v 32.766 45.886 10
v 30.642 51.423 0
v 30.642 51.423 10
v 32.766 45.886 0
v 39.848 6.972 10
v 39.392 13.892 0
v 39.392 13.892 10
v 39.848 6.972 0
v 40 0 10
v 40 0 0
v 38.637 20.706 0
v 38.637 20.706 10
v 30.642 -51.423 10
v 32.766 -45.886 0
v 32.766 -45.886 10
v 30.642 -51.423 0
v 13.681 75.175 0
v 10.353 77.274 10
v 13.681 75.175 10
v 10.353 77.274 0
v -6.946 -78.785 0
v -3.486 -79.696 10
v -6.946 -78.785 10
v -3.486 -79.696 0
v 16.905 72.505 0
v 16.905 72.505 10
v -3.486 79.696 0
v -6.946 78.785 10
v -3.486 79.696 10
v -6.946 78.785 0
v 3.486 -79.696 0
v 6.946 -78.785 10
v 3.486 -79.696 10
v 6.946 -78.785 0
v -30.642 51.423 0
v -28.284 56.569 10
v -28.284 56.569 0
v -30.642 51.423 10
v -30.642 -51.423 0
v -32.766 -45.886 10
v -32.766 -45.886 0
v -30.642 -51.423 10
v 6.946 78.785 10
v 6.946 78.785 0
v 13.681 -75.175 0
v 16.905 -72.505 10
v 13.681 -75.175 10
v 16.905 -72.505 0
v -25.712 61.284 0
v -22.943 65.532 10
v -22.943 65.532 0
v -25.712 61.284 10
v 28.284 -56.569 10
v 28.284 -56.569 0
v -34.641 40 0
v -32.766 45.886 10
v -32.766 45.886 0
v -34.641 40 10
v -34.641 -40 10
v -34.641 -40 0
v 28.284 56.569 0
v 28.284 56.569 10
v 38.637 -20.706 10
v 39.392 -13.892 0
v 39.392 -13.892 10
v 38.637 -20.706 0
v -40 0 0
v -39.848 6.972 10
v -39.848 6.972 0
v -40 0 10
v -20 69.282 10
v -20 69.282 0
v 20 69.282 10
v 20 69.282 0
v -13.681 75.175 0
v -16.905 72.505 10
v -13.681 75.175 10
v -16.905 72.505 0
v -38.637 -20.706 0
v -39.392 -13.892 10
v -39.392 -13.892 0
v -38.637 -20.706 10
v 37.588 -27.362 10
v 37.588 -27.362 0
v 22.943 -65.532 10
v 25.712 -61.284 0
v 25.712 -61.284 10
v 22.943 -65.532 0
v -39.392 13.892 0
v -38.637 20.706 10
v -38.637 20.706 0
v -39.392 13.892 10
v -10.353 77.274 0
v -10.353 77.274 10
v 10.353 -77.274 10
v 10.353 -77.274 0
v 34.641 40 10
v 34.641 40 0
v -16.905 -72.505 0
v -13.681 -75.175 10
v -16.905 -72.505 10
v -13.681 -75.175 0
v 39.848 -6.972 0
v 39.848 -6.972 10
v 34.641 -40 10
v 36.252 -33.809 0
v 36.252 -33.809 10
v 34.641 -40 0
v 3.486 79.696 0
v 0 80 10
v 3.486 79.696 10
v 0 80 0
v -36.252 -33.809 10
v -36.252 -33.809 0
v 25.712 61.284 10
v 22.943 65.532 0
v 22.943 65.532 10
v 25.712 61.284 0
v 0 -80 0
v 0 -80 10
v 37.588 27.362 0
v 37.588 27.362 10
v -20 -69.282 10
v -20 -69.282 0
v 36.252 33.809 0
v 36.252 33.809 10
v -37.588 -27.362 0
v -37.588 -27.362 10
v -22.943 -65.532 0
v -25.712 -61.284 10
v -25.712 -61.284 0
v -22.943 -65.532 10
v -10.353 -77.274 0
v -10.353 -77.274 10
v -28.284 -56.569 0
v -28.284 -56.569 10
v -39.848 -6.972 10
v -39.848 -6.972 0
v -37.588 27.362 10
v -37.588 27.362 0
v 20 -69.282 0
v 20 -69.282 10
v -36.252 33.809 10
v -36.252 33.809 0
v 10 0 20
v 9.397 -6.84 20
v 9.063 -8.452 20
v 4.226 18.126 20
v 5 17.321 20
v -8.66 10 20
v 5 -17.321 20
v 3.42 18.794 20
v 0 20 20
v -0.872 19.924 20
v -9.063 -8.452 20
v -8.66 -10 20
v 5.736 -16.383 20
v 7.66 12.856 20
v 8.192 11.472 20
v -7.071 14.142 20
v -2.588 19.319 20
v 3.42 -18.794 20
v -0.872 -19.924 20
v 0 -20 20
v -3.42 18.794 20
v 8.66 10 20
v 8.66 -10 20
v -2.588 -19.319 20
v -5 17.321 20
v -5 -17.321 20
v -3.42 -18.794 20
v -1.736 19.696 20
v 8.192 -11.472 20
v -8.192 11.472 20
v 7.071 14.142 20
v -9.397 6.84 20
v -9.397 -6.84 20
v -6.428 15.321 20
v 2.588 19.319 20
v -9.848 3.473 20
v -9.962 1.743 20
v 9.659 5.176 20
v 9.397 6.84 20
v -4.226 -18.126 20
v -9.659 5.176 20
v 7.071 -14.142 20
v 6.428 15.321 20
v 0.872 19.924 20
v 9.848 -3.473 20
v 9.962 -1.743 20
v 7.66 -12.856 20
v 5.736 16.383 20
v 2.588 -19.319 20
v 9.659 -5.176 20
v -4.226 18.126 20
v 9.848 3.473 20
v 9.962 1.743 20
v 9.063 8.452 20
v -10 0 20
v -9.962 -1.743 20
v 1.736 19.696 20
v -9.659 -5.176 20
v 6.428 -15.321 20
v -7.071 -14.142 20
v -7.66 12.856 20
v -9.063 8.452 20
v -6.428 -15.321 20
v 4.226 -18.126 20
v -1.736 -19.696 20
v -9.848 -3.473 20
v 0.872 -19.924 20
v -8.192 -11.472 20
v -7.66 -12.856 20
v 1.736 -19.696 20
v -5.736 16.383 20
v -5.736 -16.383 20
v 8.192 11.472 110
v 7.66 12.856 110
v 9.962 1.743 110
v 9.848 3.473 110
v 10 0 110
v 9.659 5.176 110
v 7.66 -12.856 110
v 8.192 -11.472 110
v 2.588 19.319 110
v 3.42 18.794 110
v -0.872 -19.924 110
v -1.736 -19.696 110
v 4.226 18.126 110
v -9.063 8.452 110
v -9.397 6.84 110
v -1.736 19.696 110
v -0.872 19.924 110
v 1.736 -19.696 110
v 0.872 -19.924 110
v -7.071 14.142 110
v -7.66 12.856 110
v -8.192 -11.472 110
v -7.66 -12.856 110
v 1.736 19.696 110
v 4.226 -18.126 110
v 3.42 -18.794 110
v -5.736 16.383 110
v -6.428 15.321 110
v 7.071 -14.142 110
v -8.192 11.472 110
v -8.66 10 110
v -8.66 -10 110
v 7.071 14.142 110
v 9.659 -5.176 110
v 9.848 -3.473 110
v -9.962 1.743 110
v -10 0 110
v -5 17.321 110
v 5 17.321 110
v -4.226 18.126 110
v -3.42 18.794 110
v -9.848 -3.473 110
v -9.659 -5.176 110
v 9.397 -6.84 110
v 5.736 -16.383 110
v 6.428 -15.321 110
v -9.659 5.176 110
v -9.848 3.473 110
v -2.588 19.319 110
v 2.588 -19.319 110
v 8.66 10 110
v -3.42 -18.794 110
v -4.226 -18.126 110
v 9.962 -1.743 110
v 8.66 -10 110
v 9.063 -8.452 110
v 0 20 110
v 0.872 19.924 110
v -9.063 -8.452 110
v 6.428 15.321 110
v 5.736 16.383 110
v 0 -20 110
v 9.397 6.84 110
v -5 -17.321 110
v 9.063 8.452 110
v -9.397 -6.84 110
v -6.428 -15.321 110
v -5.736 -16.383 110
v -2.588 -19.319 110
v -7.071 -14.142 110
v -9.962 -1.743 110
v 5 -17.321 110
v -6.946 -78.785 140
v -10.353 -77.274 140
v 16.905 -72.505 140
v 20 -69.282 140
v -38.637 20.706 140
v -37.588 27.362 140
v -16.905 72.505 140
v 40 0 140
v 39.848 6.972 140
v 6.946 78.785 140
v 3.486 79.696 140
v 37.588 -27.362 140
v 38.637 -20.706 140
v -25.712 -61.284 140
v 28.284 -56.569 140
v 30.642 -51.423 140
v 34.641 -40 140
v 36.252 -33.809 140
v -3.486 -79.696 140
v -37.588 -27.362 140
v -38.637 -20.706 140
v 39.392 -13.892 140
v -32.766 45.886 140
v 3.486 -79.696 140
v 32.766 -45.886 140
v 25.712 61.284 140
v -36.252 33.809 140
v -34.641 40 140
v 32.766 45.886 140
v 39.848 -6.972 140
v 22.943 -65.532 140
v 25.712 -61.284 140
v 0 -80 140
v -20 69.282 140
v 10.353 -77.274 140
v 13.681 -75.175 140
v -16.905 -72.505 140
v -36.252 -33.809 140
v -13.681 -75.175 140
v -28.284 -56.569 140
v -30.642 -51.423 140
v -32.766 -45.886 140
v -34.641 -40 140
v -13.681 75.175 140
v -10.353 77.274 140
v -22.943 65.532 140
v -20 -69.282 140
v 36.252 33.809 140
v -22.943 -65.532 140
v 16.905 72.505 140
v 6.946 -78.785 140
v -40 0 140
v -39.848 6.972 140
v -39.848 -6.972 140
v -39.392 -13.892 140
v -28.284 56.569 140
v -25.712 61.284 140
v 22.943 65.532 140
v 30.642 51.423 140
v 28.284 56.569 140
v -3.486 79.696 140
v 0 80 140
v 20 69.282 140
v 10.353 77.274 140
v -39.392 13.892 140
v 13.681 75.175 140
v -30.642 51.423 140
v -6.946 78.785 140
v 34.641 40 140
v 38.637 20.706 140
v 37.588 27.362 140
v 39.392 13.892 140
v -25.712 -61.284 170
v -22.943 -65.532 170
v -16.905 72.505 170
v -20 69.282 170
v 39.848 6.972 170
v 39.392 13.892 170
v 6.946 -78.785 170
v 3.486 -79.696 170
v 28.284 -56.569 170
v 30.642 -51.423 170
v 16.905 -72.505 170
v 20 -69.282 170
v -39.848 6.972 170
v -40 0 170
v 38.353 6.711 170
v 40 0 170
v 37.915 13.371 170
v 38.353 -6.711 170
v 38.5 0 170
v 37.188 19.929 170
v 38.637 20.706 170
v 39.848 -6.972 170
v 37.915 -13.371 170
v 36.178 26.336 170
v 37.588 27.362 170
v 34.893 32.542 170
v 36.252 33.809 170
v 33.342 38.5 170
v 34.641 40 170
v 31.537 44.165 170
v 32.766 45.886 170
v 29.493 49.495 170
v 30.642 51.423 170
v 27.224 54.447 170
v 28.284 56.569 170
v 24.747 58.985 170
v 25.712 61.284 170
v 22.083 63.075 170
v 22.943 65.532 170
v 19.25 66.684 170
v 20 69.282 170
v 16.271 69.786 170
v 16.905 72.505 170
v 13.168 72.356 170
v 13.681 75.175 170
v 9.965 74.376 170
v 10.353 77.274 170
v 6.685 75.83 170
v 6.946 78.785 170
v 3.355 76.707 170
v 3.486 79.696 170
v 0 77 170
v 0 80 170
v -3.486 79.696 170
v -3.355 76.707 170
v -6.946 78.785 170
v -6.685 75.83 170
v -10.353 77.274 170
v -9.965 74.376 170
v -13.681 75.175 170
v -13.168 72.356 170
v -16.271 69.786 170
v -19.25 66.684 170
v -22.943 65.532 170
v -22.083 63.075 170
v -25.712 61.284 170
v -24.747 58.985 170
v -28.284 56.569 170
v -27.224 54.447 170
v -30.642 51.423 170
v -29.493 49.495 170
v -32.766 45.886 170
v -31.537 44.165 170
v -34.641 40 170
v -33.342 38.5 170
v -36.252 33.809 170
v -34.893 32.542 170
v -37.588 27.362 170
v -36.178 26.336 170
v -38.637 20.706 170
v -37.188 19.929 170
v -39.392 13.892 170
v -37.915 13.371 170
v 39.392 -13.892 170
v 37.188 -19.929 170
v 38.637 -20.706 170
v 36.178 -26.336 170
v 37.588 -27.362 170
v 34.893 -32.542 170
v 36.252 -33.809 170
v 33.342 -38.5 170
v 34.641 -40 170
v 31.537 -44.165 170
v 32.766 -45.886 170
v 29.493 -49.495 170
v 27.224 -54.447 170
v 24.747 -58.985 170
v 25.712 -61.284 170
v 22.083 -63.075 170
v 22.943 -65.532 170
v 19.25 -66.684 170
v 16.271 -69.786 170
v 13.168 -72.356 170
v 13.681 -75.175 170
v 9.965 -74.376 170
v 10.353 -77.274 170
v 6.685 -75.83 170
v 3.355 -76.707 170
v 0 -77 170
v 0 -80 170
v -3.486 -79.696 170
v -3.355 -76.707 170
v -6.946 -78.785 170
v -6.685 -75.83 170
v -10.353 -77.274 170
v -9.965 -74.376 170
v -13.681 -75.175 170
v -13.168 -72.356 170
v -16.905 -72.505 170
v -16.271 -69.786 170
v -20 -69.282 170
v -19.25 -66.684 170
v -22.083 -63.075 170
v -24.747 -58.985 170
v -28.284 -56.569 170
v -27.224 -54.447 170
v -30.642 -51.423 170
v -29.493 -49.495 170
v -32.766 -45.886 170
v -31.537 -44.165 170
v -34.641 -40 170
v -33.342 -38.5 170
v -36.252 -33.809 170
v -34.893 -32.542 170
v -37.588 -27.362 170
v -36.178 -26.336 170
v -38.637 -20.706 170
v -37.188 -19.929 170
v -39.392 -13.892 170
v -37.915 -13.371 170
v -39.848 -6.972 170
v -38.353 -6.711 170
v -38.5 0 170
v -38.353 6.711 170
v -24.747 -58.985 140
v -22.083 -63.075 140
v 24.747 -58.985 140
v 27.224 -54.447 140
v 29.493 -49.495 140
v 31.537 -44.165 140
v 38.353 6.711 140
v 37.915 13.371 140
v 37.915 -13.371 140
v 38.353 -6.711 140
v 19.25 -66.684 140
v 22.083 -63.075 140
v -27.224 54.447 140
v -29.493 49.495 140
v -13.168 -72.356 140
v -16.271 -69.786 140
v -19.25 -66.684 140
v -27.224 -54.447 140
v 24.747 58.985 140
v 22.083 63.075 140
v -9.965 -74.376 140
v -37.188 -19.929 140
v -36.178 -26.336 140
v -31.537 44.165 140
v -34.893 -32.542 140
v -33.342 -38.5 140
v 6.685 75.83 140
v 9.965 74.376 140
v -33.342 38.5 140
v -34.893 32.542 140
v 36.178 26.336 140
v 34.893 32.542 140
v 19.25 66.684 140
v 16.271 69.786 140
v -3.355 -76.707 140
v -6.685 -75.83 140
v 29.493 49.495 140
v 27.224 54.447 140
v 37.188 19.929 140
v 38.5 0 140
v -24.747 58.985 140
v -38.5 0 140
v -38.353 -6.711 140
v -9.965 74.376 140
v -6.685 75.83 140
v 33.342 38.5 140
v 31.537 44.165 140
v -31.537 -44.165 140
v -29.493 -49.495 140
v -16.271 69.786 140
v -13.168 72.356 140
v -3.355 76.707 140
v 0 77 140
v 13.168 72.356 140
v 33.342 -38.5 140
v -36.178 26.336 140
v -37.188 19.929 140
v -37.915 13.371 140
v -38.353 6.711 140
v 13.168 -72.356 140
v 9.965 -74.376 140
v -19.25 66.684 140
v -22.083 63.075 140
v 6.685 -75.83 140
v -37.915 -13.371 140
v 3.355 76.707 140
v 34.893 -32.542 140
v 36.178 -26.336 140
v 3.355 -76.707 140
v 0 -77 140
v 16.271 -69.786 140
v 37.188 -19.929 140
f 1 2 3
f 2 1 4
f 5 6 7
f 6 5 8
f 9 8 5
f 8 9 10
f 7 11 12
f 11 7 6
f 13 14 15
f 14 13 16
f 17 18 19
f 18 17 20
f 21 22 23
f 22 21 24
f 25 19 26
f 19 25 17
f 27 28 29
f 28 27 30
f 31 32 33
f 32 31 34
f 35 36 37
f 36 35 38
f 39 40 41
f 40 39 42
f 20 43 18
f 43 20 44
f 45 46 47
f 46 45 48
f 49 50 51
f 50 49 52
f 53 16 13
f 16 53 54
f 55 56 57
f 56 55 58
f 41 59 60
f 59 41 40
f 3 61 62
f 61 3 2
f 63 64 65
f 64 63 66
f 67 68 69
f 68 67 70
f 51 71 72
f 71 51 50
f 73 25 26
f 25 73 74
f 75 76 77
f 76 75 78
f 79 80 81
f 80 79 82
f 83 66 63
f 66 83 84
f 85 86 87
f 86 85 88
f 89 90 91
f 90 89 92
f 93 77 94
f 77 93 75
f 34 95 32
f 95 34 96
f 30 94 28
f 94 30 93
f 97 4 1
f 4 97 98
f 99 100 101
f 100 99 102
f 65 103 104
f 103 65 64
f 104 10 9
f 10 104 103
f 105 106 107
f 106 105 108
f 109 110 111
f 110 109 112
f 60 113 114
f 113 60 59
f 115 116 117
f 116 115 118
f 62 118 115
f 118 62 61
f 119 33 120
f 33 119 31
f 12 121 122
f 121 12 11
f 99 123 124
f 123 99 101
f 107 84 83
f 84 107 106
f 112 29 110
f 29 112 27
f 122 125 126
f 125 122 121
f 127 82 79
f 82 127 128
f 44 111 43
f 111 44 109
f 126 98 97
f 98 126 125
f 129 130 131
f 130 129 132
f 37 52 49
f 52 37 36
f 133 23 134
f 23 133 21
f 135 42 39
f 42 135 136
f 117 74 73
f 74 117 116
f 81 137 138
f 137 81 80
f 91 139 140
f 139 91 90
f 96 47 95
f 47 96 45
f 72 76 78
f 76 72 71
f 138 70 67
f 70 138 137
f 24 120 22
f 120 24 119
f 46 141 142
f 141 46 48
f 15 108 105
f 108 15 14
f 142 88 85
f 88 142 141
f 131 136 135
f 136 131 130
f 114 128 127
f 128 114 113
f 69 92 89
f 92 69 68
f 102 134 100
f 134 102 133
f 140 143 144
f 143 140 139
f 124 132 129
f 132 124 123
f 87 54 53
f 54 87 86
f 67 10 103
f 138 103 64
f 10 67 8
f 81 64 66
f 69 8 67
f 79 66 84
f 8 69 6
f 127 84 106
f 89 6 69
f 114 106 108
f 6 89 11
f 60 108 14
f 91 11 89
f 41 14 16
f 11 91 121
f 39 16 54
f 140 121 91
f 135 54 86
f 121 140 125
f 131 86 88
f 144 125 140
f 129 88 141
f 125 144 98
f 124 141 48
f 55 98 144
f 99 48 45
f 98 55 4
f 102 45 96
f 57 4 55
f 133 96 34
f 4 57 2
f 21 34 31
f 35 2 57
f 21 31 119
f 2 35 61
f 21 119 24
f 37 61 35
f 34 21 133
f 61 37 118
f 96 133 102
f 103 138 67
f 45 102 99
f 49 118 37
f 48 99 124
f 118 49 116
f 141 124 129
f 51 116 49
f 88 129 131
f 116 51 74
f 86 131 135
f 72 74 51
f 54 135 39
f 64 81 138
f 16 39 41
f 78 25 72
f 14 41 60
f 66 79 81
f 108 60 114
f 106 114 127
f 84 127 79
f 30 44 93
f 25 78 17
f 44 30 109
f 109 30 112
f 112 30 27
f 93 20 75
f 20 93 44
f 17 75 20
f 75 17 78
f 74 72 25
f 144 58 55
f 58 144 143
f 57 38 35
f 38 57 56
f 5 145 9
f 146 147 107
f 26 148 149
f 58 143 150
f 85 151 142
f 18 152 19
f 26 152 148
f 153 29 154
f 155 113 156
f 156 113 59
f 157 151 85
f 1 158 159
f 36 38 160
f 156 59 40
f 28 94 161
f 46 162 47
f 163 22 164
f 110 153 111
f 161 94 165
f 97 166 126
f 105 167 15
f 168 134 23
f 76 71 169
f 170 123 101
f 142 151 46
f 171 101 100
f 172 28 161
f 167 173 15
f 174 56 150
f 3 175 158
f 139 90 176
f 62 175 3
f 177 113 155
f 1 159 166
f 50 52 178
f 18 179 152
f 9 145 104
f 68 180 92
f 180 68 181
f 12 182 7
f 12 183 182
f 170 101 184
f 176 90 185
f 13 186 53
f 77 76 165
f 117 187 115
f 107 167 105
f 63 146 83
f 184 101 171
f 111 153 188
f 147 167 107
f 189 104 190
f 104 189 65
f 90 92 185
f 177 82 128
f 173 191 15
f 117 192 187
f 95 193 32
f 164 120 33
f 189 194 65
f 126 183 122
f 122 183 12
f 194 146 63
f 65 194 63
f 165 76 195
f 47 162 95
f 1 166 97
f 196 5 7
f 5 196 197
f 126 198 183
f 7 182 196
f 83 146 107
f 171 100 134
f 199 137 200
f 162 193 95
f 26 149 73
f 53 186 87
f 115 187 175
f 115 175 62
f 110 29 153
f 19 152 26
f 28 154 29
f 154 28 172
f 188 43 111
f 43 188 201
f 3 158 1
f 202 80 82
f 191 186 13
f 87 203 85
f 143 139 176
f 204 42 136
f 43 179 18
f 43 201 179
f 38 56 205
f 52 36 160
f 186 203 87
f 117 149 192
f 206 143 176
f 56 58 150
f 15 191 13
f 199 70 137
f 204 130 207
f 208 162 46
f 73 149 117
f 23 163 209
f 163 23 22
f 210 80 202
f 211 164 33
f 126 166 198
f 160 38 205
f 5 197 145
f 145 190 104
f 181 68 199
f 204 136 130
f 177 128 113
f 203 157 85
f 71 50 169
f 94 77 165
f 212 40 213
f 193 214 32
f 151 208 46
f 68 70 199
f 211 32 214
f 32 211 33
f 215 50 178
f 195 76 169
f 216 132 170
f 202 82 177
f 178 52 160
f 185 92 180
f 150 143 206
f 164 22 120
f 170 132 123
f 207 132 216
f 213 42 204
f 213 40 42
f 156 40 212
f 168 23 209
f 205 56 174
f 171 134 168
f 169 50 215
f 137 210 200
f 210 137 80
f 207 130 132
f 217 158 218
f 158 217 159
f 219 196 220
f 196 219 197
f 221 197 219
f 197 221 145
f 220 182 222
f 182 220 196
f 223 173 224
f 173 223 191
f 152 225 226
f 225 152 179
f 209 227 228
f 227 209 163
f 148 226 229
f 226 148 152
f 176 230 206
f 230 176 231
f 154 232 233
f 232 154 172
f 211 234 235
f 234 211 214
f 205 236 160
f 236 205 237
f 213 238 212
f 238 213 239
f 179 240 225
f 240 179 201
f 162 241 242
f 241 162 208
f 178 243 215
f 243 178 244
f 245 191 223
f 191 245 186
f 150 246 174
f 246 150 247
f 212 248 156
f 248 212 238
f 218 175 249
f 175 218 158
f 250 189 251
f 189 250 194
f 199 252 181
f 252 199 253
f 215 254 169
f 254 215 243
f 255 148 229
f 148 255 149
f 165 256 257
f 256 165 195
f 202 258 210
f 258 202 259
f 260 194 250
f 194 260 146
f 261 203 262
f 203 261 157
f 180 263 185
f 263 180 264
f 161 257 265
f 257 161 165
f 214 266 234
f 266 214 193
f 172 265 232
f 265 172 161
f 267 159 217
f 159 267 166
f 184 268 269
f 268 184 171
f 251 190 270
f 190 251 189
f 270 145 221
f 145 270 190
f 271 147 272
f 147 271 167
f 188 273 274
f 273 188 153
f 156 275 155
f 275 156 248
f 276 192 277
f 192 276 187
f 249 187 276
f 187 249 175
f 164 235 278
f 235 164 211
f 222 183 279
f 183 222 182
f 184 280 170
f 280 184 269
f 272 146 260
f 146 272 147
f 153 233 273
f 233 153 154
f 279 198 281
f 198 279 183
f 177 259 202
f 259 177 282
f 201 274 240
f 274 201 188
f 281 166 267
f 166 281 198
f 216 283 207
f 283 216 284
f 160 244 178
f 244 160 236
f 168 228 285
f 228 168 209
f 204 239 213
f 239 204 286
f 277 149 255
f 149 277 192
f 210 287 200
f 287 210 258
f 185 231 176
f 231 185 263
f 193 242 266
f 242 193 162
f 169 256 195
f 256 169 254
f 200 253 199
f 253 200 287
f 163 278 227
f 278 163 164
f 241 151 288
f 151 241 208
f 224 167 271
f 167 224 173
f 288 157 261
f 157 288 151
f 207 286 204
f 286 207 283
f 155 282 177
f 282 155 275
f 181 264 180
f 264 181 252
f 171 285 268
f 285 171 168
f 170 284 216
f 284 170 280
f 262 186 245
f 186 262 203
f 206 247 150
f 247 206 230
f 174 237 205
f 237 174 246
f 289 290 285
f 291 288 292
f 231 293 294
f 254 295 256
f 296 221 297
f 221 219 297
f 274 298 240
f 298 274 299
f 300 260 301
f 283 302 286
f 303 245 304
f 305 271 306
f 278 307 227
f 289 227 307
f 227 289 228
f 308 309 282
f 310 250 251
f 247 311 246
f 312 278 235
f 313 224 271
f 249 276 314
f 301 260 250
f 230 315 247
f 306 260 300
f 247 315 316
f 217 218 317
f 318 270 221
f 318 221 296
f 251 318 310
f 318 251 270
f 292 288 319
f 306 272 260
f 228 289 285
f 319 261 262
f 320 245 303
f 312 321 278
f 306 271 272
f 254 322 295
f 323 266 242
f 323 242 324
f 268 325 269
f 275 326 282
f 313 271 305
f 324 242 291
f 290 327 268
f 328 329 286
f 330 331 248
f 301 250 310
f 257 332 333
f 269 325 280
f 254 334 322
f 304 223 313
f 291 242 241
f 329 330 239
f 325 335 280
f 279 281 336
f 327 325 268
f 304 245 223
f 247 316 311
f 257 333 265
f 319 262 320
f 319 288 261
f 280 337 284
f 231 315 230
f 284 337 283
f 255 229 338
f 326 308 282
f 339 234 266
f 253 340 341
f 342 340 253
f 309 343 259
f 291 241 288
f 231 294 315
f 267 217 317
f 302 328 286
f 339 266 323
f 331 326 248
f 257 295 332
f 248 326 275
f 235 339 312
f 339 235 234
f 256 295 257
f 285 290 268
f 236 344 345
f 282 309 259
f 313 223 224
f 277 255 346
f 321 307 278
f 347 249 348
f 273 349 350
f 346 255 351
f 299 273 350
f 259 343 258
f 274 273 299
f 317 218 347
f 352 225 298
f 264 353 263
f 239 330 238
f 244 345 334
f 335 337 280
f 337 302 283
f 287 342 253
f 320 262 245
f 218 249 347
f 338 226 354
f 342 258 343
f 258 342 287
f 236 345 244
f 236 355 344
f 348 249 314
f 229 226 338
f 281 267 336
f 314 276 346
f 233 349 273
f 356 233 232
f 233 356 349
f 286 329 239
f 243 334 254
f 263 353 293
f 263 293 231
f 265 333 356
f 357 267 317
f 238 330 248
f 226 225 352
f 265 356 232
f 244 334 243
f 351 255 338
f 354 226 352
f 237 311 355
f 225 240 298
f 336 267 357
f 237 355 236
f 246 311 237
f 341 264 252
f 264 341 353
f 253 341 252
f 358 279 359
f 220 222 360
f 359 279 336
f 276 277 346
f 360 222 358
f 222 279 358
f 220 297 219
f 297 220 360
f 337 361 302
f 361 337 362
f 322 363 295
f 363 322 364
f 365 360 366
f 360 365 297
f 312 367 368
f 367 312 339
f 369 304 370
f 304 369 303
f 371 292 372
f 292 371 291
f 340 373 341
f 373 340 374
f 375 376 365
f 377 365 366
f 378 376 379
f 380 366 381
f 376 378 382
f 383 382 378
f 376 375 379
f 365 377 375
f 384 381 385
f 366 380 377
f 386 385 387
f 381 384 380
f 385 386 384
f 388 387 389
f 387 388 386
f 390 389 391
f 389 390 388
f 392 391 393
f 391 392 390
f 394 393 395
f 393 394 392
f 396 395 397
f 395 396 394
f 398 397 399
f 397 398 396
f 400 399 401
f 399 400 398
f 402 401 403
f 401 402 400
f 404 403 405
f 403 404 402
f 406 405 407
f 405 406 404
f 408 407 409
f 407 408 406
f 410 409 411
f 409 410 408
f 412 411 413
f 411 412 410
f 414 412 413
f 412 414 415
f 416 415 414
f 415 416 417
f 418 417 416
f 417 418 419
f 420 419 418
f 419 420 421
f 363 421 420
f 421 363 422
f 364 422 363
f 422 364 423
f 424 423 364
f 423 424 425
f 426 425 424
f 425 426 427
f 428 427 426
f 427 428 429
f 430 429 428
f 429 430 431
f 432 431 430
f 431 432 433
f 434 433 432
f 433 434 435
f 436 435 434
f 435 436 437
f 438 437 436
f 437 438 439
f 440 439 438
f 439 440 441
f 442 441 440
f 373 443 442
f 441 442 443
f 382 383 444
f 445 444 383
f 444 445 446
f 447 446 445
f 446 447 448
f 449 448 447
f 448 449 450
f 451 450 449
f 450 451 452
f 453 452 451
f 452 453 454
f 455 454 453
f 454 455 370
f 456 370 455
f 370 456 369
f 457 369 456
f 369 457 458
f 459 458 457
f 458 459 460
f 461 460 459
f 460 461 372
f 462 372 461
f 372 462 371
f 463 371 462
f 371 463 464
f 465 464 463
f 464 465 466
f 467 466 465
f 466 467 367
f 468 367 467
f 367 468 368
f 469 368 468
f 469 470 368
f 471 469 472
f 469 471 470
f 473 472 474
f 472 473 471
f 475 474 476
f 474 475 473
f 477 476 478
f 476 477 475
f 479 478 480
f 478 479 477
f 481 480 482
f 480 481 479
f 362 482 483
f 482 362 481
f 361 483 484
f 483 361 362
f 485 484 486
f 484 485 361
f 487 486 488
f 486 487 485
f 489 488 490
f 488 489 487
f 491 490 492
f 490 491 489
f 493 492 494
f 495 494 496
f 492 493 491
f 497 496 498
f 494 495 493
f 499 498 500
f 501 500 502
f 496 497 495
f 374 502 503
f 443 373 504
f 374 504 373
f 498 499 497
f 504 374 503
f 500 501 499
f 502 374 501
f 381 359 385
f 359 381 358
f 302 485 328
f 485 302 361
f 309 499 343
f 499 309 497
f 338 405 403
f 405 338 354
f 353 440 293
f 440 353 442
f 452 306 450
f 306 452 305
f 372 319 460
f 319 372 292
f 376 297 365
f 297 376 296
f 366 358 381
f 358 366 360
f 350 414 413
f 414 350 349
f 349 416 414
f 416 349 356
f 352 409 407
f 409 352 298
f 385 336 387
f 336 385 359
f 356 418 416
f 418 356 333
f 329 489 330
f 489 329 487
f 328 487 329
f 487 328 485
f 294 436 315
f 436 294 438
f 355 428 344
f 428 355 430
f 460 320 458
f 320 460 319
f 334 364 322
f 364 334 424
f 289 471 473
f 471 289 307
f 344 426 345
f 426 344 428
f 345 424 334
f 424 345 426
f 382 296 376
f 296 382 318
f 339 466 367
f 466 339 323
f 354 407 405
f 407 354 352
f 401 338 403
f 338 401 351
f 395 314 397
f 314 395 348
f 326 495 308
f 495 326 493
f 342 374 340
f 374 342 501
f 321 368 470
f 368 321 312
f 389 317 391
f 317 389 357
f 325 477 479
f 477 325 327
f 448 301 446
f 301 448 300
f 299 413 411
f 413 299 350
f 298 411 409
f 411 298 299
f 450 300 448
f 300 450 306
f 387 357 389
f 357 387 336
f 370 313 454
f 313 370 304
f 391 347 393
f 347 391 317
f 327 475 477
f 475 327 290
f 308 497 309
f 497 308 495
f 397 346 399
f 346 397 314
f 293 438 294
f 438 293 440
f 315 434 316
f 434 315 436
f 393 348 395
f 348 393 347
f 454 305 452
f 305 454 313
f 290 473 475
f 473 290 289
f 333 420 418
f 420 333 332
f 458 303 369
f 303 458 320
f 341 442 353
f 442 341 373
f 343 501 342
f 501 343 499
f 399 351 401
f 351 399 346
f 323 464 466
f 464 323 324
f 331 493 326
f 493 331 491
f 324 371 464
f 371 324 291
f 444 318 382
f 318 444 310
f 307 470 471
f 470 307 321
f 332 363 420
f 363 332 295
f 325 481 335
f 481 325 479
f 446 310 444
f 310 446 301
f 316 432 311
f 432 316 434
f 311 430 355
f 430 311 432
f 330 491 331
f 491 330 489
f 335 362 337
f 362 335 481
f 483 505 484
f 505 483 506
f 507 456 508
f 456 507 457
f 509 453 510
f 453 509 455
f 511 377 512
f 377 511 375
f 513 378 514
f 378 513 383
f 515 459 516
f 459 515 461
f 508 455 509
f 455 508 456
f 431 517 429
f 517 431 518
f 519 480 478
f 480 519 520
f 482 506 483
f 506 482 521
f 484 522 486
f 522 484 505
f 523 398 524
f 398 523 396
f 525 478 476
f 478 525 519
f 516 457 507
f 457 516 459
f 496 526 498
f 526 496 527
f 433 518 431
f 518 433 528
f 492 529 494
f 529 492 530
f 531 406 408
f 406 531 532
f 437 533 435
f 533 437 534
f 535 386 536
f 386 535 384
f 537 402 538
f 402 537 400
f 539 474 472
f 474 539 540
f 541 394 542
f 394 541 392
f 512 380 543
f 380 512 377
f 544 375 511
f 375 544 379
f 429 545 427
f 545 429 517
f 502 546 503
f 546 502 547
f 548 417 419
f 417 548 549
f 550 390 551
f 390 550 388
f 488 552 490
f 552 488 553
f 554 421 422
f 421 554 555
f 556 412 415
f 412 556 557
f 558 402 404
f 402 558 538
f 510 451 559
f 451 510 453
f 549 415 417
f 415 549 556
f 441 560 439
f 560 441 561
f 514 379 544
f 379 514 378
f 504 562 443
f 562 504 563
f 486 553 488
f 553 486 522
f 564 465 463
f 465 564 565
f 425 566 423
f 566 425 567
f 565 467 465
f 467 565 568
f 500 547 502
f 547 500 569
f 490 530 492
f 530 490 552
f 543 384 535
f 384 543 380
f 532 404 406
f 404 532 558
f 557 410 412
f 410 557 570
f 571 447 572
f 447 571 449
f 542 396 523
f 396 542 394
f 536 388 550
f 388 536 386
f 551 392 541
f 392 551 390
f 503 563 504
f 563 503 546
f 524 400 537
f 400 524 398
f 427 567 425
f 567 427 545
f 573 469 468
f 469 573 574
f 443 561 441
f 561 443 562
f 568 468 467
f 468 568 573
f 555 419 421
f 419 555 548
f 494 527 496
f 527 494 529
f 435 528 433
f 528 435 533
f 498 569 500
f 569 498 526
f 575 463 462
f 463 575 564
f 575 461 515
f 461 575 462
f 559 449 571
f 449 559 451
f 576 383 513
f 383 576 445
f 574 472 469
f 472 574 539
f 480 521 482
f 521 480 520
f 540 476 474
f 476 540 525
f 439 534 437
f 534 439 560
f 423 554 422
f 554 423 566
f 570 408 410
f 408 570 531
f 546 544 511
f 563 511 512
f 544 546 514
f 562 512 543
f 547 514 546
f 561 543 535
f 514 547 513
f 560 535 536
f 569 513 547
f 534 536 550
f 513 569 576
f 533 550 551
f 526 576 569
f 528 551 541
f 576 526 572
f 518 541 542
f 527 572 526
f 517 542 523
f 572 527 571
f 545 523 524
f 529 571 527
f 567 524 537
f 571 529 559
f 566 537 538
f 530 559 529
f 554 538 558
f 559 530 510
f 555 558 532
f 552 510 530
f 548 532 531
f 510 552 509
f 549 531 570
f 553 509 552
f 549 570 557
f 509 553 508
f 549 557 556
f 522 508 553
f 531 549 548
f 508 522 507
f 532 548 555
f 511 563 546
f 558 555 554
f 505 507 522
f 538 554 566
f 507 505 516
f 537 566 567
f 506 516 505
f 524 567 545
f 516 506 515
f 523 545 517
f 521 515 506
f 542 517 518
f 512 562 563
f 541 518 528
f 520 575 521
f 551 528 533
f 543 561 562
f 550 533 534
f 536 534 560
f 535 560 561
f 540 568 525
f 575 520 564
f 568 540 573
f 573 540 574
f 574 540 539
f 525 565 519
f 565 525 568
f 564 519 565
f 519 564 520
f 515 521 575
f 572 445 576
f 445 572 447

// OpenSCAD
$fn = 72;


Stretch = 2;
ShaftLength = 100;
ShaftRadius = 10;
BaseLength = 10;
BaseRadius = 40;
BaseTransition=10;
WallThickness = 1.5;
TopTransition = 30;
TopLength=30;



difference() {
    scale([1,Stretch,1]) {
        cylinder(r=BaseRadius,h=BaseLength);
        translate([0,0,BaseLength])
            cylinder(r1=BaseRadius, r2=ShaftRadius,h=BaseTransition);
        translate([0,0,BaseLength+BaseTransition])
            cylinder(r=ShaftRadius,h=ShaftLength);
        translate([0,0,BaseLength+ShaftLength])
            cylinder(r1=ShaftRadius, r2=BaseRadius,h=TopTransition);
        translate([0,0,BaseLength+ShaftLength+TopTransition])
            cylinder(r=BaseRadius,h=TopLength);
    }
    scale([1,Stretch,1])
        translate([0,0,BaseLength+ShaftLength+TopTransition])
                cylinder(r=BaseRadius-WallThickness,h=TopLength+1);
}
